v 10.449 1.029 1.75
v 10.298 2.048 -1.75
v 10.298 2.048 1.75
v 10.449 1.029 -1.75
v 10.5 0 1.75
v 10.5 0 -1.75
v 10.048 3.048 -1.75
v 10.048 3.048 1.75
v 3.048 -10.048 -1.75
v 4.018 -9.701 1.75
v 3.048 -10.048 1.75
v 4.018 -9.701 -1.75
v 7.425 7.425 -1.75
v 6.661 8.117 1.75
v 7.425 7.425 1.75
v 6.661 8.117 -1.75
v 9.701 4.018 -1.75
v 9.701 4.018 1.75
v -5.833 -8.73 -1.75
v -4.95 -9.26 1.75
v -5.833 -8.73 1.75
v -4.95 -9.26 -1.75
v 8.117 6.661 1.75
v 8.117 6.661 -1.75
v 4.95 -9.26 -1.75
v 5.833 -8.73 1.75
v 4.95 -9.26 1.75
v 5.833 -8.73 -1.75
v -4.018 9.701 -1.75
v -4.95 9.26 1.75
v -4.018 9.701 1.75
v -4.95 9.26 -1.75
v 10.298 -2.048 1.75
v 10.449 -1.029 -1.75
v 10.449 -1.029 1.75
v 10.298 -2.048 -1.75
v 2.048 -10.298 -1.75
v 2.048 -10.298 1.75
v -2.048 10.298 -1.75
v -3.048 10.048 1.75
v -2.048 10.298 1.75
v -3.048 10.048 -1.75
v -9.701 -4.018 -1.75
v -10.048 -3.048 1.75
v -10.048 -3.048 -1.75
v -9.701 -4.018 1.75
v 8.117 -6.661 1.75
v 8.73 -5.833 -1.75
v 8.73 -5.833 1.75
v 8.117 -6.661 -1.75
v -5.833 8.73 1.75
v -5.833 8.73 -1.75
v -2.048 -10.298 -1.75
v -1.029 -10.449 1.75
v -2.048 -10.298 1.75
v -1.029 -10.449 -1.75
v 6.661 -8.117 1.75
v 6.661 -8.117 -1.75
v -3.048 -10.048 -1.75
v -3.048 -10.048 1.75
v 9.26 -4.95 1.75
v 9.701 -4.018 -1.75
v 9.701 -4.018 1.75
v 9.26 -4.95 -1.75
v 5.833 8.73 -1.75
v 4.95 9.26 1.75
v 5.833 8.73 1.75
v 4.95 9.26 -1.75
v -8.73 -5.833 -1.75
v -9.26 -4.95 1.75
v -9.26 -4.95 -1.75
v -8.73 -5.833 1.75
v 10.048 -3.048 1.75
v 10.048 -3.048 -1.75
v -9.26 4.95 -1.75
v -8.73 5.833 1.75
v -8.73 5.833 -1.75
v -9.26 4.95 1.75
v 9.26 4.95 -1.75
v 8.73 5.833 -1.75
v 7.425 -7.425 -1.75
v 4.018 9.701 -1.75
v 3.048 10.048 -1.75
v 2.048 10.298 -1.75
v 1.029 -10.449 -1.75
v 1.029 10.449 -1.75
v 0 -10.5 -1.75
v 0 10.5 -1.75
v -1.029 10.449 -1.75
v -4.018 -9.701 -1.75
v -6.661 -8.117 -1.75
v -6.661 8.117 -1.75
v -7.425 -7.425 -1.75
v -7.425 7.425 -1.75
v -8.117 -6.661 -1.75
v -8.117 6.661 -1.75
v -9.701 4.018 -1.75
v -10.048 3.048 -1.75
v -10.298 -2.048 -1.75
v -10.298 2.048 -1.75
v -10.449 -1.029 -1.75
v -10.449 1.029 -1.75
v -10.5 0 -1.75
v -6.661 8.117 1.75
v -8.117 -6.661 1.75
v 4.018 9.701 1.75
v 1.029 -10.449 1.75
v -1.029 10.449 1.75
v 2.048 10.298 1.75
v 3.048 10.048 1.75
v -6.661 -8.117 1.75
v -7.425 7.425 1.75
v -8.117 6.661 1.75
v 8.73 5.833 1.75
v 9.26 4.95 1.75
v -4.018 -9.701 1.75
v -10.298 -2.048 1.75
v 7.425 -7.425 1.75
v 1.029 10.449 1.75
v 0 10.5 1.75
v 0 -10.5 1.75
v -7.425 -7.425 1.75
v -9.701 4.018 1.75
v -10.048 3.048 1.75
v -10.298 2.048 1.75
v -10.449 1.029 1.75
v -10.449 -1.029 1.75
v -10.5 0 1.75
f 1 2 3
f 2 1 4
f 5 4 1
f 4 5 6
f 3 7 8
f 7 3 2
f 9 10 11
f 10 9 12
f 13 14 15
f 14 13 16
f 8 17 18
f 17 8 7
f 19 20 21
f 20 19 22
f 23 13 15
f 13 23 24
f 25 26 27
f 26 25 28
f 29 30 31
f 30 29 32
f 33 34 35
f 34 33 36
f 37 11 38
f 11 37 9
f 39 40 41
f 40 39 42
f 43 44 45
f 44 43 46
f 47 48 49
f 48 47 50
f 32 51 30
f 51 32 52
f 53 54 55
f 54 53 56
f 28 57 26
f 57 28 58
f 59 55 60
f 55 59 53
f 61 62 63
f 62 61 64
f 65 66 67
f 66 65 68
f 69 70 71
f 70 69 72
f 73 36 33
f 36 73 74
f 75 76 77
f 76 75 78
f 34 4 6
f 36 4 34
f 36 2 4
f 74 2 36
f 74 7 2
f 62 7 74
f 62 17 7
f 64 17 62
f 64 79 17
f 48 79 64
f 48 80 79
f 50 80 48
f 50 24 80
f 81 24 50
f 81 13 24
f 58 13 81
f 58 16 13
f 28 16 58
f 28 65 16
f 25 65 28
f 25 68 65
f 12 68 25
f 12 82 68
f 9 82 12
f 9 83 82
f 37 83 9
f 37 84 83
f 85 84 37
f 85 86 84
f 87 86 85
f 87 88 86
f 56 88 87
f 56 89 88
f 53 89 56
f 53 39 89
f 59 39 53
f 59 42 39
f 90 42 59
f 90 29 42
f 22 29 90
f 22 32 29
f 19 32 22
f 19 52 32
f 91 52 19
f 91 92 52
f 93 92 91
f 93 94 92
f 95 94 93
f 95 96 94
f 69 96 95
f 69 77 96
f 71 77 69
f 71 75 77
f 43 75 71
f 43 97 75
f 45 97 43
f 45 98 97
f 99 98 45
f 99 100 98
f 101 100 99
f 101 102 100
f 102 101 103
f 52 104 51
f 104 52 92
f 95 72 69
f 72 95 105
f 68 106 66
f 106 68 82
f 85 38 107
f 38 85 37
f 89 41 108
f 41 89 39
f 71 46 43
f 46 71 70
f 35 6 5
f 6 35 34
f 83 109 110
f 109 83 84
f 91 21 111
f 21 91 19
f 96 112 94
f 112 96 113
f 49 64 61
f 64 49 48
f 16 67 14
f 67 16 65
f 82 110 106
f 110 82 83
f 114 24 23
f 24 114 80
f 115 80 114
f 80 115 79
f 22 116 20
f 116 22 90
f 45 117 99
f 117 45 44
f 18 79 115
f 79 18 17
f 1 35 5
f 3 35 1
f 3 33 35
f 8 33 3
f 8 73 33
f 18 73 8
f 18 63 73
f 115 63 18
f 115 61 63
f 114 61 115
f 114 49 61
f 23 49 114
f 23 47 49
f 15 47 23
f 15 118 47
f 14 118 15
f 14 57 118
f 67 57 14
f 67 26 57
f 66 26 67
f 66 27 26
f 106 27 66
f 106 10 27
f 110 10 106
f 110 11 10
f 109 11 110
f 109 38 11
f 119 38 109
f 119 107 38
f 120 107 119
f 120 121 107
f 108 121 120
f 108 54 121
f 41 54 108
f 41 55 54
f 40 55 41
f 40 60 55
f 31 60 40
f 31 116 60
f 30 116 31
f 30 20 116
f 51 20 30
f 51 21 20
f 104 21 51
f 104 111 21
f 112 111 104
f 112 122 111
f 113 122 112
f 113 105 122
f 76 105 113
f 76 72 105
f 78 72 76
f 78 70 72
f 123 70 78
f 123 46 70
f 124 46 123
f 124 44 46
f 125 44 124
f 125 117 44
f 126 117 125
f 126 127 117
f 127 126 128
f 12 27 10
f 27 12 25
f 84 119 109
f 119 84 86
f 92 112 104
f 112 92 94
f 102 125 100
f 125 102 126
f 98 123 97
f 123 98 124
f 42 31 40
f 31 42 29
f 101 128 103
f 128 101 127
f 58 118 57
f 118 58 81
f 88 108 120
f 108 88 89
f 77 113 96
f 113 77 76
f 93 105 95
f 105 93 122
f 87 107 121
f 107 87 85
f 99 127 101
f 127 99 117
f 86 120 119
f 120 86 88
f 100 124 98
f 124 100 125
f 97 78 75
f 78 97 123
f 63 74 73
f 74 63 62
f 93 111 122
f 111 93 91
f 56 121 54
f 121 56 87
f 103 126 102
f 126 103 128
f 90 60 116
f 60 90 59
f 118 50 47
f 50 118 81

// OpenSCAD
$fn=64;

module radial(a=[10.5,3.7,3.5]) {
    union() {
        cylinder(h=a[2], r=a[0], center=true);
        cylinder(h=a[2], r=a[1], center=true);
    }
}

radial([10.5,3.7,3.5]);
